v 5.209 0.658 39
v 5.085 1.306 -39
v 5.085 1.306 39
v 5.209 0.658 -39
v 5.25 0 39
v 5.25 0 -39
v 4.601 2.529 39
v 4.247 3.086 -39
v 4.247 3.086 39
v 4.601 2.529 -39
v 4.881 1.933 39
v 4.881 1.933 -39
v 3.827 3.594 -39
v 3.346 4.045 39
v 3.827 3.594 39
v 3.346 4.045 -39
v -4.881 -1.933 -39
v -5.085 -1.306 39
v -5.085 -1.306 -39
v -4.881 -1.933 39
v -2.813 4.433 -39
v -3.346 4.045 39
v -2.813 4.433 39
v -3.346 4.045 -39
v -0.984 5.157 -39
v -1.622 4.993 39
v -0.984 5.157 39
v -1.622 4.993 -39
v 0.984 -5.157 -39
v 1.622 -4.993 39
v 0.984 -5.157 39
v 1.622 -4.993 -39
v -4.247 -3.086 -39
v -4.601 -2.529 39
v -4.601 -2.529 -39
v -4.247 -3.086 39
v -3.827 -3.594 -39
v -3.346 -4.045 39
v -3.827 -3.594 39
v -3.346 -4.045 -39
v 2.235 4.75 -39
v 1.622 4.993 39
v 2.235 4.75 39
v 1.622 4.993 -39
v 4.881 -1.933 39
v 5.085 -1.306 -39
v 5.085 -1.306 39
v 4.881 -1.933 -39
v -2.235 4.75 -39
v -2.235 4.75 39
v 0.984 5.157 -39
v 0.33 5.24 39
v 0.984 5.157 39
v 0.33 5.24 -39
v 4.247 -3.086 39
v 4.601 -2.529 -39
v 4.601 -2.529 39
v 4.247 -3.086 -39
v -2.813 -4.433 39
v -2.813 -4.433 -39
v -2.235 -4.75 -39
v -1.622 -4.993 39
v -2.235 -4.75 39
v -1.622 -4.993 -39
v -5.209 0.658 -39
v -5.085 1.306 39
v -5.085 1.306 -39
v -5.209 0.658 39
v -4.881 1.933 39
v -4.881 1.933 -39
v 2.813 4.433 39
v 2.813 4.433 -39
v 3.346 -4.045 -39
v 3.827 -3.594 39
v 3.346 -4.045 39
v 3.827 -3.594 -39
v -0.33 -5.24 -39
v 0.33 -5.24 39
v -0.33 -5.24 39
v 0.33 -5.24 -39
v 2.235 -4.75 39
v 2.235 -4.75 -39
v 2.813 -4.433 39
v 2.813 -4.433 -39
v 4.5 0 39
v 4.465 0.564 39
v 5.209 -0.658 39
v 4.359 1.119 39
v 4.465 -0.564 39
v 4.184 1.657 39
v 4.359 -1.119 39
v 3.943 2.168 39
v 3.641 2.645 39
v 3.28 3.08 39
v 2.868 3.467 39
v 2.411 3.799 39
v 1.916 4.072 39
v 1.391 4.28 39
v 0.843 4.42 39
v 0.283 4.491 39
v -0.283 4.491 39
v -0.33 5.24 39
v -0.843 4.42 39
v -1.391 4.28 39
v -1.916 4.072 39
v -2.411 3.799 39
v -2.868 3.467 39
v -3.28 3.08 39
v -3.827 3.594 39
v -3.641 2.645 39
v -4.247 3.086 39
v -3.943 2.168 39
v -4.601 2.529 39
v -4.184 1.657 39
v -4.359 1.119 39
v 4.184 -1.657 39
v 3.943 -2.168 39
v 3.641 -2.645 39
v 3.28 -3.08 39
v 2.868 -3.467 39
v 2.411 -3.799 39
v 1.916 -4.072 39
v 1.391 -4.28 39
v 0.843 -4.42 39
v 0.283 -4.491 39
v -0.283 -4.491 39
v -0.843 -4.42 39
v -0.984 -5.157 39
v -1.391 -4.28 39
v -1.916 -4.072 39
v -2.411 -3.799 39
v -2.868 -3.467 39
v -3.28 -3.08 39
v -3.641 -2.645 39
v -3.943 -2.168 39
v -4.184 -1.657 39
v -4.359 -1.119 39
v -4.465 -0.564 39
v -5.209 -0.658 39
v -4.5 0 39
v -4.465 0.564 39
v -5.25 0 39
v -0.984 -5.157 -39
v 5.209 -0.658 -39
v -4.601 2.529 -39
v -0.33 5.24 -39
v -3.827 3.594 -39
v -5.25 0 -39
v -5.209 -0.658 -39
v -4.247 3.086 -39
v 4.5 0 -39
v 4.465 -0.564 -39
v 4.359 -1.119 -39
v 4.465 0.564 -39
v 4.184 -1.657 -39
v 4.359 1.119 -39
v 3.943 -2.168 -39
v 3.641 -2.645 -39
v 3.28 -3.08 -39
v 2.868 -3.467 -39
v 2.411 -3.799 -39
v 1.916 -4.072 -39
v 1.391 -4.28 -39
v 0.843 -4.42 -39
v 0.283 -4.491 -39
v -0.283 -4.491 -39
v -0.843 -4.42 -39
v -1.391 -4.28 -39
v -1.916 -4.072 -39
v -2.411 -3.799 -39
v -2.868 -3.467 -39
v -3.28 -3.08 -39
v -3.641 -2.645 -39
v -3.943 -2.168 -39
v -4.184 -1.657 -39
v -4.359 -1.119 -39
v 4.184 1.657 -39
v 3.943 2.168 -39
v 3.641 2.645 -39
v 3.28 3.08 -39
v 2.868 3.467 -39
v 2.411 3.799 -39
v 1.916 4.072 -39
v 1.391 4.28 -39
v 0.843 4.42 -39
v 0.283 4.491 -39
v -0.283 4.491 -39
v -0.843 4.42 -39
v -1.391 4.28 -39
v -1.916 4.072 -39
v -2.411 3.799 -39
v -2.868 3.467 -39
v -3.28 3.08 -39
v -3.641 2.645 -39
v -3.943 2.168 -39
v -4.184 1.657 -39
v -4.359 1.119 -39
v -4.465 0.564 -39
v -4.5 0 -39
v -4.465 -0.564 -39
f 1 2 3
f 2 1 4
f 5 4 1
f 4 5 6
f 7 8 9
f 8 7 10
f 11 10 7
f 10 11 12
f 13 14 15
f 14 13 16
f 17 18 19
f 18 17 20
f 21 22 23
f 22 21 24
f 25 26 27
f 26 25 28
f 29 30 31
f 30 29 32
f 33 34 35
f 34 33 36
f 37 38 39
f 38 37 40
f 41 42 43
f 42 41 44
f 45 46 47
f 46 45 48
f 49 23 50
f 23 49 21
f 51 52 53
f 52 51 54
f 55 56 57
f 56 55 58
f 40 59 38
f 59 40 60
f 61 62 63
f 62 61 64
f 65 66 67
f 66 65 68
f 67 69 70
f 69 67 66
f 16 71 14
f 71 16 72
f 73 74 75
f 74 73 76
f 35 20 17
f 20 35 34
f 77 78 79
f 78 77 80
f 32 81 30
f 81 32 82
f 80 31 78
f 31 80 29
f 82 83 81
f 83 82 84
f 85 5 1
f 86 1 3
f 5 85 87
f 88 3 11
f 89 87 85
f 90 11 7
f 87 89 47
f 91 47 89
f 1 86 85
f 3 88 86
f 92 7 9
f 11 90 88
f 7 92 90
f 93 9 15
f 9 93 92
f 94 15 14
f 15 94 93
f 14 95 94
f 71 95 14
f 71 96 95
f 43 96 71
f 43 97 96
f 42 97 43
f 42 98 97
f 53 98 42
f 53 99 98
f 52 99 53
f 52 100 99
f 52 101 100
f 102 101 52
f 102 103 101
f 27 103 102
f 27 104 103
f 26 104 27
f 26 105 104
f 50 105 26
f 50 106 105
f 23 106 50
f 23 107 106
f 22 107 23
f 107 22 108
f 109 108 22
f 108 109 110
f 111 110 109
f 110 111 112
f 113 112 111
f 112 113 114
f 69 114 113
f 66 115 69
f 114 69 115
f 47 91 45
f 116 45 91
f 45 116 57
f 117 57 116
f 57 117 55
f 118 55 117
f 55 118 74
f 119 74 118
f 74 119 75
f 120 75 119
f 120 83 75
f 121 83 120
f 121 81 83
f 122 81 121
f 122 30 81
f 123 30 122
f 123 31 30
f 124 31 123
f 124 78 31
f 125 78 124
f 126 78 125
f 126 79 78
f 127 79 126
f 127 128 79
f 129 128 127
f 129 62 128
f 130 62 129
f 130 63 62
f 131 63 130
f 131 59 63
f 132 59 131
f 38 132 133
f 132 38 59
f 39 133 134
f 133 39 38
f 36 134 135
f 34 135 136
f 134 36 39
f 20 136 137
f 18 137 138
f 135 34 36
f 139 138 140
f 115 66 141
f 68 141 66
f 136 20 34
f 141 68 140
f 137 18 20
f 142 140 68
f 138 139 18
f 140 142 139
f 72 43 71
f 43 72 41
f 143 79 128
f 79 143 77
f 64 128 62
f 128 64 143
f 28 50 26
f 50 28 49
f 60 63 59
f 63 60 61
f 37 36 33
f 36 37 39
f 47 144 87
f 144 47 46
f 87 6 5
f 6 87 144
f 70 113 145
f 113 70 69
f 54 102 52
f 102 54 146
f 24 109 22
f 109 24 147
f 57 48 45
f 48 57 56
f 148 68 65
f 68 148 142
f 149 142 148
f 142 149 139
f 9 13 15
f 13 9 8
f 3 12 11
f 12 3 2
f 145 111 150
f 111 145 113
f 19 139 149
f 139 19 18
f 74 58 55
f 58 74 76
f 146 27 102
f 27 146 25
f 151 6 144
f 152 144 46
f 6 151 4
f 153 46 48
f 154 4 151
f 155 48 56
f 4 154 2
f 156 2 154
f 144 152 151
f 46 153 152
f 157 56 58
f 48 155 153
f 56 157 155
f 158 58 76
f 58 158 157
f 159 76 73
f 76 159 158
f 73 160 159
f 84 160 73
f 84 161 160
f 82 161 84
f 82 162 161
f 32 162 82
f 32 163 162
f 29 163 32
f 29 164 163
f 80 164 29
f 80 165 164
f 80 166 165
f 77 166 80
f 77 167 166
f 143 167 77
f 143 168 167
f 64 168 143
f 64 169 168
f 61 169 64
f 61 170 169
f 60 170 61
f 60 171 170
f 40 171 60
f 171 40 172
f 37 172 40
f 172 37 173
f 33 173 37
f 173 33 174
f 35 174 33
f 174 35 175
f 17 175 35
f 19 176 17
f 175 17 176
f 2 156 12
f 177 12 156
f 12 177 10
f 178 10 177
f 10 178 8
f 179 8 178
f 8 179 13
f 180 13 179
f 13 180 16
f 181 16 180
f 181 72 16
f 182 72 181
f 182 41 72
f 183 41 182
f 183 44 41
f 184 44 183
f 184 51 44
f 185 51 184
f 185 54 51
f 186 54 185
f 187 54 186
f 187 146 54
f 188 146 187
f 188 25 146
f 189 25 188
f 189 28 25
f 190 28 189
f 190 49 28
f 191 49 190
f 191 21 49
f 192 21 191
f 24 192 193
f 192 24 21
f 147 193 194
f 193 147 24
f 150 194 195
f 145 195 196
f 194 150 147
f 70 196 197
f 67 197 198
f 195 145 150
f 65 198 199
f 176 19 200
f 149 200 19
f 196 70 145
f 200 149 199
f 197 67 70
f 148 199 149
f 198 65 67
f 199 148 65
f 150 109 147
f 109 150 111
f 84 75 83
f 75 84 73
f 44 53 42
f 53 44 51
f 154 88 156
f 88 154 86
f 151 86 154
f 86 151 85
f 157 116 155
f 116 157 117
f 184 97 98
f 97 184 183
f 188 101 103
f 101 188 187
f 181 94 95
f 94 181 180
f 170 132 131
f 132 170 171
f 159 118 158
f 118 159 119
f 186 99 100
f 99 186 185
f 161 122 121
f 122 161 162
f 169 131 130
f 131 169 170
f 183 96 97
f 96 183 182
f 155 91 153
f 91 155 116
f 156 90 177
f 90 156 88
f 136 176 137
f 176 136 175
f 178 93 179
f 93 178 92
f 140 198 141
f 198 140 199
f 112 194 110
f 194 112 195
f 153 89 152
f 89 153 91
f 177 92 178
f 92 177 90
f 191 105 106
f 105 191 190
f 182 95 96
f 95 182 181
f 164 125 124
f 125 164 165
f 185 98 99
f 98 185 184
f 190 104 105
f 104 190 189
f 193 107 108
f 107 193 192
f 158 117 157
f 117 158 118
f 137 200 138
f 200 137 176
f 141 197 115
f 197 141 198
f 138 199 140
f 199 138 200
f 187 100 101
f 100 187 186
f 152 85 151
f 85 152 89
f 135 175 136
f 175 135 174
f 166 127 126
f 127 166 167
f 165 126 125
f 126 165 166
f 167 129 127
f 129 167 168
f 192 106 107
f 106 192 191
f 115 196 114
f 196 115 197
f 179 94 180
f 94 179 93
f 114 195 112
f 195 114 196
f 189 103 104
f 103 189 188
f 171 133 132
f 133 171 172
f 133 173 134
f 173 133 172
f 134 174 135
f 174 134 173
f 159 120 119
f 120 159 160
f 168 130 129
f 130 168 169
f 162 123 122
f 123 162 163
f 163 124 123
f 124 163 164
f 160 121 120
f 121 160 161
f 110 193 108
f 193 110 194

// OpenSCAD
$fn = 50;


difference() {
	union() {
		translate(v = [0, 0, -39.0000000000]) {
			cylinder(h = 78, r = 5.2500000000);
		}
	}
	union() {
		translate(v = [0, 0, -100.0000000000]) {
			cylinder(h = 200, r = 4.5000000000);
		}
	}
}
